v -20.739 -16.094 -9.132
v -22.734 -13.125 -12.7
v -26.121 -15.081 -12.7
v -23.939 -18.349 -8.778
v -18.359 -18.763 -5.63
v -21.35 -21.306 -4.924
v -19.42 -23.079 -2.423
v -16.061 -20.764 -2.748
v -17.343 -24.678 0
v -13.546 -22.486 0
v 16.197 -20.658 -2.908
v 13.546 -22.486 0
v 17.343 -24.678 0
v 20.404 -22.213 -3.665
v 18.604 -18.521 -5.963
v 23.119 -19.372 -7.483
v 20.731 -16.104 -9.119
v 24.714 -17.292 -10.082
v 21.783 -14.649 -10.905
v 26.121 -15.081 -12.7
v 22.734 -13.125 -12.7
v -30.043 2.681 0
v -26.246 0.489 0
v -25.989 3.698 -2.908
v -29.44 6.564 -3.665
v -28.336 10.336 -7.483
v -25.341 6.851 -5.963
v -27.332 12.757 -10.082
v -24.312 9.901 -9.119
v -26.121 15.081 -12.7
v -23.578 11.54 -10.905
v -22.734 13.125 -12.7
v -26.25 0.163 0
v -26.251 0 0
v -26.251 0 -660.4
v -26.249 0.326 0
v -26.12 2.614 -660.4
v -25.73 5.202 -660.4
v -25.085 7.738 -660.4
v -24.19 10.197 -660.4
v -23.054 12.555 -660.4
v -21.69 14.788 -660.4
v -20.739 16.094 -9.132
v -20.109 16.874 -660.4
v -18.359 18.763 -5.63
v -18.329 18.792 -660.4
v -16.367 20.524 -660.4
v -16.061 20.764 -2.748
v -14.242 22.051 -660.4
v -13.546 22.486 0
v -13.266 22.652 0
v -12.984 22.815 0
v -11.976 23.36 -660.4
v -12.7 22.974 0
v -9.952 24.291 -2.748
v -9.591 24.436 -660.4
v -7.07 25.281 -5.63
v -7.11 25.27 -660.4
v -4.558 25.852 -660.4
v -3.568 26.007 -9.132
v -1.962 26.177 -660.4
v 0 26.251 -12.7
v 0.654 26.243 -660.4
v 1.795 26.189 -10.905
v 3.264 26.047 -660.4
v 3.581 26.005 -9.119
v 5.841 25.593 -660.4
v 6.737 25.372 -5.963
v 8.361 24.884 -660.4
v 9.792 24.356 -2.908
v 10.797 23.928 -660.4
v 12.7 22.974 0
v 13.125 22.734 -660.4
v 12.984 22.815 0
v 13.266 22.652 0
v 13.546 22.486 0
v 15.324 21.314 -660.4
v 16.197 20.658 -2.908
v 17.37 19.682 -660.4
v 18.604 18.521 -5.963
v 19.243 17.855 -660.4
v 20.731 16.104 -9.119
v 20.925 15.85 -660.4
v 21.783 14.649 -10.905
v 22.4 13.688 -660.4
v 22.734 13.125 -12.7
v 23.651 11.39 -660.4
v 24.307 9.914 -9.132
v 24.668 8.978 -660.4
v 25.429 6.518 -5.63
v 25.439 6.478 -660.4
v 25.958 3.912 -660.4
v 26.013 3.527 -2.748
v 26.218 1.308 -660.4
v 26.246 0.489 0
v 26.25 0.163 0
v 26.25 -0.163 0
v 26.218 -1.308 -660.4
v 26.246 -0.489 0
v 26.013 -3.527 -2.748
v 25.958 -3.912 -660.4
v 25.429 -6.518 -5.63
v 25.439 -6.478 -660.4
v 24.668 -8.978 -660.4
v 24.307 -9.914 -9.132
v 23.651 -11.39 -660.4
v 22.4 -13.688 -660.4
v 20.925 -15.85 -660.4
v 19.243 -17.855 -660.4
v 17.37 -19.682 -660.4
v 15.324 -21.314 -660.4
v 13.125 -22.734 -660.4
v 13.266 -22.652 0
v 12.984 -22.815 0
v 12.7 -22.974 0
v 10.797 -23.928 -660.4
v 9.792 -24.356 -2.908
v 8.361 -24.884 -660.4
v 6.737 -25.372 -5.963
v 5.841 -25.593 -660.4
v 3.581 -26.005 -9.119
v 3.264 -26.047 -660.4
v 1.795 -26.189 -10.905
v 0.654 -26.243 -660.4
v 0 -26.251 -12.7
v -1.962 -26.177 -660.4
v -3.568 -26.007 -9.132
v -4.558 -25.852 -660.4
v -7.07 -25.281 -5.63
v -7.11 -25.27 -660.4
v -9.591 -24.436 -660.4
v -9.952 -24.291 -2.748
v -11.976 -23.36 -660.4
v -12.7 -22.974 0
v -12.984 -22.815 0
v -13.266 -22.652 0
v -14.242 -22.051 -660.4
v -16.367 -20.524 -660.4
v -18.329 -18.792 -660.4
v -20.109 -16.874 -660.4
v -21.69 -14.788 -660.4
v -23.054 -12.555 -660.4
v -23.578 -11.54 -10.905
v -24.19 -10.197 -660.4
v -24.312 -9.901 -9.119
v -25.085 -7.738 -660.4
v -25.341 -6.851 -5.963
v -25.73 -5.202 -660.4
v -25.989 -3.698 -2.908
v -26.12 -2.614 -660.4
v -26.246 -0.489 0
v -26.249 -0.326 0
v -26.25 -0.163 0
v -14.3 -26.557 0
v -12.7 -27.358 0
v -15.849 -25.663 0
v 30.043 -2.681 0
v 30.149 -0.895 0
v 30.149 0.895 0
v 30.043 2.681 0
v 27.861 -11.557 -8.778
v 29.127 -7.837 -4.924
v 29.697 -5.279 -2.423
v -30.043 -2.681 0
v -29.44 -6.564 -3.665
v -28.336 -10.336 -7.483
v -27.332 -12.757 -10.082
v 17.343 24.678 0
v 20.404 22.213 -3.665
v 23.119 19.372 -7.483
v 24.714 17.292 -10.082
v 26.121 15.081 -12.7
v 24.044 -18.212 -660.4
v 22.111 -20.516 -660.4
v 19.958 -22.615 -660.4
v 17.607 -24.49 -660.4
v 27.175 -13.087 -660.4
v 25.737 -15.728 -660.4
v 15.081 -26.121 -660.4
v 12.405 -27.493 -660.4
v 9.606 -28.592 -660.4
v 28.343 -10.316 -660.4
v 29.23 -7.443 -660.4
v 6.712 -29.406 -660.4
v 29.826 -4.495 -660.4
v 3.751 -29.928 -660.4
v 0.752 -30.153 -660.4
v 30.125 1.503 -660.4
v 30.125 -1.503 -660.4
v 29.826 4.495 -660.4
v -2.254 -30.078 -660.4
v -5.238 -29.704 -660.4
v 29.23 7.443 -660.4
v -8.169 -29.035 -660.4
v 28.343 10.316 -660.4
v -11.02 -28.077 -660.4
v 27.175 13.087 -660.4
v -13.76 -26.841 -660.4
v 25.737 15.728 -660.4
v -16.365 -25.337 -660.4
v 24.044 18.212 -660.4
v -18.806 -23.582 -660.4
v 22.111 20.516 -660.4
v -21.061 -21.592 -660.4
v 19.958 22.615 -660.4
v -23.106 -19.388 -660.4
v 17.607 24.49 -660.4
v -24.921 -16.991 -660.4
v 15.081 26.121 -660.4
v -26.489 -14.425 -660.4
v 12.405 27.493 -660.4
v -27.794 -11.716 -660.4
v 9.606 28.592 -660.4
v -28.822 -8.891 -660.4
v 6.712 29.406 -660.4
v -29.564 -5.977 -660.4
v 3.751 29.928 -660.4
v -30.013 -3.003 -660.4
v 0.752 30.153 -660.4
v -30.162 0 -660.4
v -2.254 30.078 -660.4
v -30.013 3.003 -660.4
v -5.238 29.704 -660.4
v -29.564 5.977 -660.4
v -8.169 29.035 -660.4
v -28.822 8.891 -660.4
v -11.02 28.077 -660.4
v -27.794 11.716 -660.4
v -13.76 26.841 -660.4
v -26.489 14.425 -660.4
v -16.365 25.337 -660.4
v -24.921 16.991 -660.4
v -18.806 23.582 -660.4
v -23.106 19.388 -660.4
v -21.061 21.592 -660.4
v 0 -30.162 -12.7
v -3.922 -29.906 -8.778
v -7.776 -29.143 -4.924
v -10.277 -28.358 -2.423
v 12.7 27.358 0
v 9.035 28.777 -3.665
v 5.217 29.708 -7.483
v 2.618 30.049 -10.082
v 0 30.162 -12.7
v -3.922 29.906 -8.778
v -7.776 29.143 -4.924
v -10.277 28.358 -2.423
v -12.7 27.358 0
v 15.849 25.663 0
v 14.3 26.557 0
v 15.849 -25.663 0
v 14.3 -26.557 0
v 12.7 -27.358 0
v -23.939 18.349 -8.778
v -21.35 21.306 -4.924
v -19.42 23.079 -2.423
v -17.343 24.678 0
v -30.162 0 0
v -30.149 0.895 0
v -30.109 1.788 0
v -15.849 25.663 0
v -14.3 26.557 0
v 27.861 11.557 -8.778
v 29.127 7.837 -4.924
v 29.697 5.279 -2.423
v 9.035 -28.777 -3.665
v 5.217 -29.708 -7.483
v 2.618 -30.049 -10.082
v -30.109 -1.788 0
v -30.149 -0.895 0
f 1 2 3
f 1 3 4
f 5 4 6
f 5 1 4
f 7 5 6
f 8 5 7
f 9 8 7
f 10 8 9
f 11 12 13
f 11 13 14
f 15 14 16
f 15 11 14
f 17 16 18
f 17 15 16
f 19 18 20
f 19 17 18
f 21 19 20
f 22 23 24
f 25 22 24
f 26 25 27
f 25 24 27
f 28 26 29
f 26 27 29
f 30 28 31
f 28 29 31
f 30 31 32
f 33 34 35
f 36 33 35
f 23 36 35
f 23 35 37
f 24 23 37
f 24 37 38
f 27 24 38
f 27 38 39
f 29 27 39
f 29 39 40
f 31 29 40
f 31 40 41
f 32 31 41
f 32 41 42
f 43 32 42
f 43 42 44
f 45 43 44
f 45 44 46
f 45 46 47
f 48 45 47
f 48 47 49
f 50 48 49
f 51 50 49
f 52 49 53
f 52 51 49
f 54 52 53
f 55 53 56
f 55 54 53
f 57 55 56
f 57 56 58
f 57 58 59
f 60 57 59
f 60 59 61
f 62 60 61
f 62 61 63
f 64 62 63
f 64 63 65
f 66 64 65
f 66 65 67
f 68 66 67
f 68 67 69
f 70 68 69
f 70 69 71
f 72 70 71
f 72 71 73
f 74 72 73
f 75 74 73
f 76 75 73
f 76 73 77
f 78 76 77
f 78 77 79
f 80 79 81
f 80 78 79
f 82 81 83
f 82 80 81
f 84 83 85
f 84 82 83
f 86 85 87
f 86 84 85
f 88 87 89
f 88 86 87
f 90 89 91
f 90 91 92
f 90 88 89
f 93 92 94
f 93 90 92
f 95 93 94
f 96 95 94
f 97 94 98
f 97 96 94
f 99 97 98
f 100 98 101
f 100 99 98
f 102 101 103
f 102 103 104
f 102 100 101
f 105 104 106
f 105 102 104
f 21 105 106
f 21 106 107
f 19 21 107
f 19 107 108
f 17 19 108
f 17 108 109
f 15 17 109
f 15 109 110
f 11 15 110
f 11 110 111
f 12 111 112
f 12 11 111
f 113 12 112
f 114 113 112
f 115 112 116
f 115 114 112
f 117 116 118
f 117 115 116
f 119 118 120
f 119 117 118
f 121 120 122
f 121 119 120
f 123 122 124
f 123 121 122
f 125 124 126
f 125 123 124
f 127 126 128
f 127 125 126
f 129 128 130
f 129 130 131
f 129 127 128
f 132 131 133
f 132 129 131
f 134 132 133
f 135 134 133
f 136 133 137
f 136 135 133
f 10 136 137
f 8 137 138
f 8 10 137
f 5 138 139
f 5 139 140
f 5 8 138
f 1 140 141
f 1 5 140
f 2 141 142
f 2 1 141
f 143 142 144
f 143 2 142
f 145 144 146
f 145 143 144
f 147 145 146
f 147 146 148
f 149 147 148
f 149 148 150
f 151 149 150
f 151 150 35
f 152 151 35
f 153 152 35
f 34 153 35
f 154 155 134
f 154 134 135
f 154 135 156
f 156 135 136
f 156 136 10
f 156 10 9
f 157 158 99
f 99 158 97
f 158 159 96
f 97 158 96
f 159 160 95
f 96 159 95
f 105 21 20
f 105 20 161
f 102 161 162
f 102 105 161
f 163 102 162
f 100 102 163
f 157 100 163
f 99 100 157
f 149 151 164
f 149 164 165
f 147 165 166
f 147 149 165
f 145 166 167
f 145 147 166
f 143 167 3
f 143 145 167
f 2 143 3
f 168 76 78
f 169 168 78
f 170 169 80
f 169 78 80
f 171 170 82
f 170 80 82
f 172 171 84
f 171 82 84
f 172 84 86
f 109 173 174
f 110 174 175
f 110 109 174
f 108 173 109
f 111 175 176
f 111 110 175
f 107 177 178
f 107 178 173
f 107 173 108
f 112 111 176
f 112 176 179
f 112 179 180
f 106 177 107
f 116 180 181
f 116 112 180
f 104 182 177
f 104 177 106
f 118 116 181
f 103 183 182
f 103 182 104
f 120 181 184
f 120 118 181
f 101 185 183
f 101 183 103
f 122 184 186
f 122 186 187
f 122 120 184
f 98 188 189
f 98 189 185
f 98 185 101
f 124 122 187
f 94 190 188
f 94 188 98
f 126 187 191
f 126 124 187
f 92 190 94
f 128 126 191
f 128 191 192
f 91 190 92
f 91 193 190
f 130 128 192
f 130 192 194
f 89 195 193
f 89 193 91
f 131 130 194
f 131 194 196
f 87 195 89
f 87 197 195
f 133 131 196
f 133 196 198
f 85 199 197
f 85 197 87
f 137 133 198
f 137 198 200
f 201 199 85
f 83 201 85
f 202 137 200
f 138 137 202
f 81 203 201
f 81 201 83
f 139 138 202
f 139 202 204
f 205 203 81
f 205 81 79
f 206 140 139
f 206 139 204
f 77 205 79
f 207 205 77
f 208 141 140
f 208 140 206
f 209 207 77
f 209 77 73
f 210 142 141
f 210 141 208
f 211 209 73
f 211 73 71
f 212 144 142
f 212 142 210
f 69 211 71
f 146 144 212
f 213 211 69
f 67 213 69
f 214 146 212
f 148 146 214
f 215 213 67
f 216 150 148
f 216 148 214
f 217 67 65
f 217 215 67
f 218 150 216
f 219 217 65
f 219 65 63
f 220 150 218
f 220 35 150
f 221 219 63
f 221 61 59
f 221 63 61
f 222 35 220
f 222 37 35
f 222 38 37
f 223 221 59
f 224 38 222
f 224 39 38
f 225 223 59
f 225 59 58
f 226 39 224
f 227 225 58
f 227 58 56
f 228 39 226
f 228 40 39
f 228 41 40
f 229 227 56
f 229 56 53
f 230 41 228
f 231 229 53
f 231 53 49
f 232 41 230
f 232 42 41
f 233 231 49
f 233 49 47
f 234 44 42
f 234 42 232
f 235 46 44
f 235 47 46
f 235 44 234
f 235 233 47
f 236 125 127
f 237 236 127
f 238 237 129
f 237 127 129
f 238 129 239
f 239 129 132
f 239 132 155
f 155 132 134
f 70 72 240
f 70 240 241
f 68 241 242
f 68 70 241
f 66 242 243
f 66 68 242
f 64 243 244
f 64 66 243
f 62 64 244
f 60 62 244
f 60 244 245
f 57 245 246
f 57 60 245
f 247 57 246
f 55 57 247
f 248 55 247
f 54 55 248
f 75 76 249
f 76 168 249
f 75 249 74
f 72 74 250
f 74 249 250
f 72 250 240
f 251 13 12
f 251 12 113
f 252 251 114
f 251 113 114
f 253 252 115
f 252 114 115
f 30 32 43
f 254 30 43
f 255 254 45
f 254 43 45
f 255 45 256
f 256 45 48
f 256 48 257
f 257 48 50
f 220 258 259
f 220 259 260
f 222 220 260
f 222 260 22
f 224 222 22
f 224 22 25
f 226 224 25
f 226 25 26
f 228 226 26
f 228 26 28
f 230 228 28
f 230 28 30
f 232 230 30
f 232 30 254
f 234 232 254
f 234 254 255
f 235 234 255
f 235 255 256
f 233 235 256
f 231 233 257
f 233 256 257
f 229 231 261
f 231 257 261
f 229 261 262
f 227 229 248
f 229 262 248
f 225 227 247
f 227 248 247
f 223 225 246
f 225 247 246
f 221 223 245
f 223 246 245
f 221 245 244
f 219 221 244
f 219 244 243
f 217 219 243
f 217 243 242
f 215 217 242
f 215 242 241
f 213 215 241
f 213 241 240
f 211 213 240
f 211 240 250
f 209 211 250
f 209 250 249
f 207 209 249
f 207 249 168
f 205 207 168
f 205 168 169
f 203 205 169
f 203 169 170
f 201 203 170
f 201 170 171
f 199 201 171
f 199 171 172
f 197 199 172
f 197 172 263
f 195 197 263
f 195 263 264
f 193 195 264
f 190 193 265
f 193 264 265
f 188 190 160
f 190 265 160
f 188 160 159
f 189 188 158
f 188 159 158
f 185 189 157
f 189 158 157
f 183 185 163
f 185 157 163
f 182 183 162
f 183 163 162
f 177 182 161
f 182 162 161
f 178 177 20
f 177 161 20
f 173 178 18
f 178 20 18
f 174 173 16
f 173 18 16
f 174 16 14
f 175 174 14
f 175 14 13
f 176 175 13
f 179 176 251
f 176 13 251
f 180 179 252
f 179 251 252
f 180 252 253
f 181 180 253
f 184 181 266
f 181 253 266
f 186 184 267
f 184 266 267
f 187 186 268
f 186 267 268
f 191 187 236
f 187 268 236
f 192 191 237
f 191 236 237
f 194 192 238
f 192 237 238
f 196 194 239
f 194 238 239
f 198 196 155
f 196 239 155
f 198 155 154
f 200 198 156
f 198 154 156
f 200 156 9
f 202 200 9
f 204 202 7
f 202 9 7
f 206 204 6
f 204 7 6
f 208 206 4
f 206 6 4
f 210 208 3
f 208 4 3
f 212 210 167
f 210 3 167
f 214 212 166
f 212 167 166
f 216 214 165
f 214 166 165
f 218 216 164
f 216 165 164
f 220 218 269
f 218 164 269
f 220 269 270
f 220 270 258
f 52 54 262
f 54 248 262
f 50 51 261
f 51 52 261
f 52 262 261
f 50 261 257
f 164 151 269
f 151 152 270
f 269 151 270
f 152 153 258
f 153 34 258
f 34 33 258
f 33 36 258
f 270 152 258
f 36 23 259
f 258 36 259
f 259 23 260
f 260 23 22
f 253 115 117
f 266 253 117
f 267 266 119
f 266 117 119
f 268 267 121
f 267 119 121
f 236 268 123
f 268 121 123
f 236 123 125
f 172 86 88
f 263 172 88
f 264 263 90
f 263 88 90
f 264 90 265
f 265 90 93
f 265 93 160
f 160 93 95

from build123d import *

# Parameters (mm, degrees)
SKETCH12_R                   = 30.1625
SKETCH12_R_2                 = 26.2509
PIPE_STANDARD_S40_P2_1_DEPTH = 660.4
CUT_EXTRUDE1_DEPTH           = 662.7761803
CUT_EXTRUDE1_DEPTH_BACK      = 662.7761803
CUT_EXTRUDE2_DEPTH           = 662.7761803
CUT_EXTRUDE2_DEPTH_BACK      = 662.7761803
CUT_EXTRUDE3_DEPTH           = 662.7761803
CUT_EXTRUDE3_DEPTH_BACK      = 662.7761803


with BuildPart() as part:
    # Sketch12 → Pipe (standard, s40) P2(1) (new body)
    with BuildSketch(Plane(origin=(0, 0, 0), x_dir=(-1, 0, 0), z_dir=(0, 0, -1))):
        Circle(SKETCH12_R)
        Circle(SKETCH12_R_2, mode=Mode.SUBTRACT)
    extrude(amount=PIPE_STANDARD_S40_P2_1_DEPTH)

    # Sketch14 → Cut-Extrude1 (cut, two sides)
    with BuildSketch(Plane(origin=(0, 0, 0), x_dir=(1, 0, 0), z_dir=(0, 1, 0))) as cut_extrude1_sk:
        Polygon((0, 12.7), (-12.7, 0), (12.7, 0), align=None)
    extrude(amount=CUT_EXTRUDE1_DEPTH, mode=Mode.SUBTRACT)
    extrude(cut_extrude1_sk.sketch, amount=-CUT_EXTRUDE1_DEPTH_BACK, mode=Mode.SUBTRACT)

    # Sketch15 → Cut-Extrude2 (cut, two sides)
    with BuildSketch(Plane(origin=(0, 0, 0), x_dir=(0, 0, -1), z_dir=(0.8660254037844364, -0.5000000000000041, 0))) as cut_extrude2_sk:
        Polygon((0, 12.7), (0, -12.7), (12.7, 0), align=None)
    extrude(amount=CUT_EXTRUDE2_DEPTH, mode=Mode.SUBTRACT)
    extrude(cut_extrude2_sk.sketch, amount=-CUT_EXTRUDE2_DEPTH_BACK, mode=Mode.SUBTRACT)

    # Sketch16 → Cut-Extrude3 (cut, two sides)
    with BuildSketch(Plane(origin=(0, 0, 0), x_dir=(0, 0, -1), z_dir=(-0.8660254037844433, -0.49999999999999195, 0))) as cut_extrude3_sk:
        Polygon((0, 12.7), (0, -12.7), (12.7, 0), align=None)
    extrude(amount=CUT_EXTRUDE3_DEPTH, mode=Mode.SUBTRACT)
    extrude(cut_extrude3_sk.sketch, amount=-CUT_EXTRUDE3_DEPTH_BACK, mode=Mode.SUBTRACT)


solid = part.part
